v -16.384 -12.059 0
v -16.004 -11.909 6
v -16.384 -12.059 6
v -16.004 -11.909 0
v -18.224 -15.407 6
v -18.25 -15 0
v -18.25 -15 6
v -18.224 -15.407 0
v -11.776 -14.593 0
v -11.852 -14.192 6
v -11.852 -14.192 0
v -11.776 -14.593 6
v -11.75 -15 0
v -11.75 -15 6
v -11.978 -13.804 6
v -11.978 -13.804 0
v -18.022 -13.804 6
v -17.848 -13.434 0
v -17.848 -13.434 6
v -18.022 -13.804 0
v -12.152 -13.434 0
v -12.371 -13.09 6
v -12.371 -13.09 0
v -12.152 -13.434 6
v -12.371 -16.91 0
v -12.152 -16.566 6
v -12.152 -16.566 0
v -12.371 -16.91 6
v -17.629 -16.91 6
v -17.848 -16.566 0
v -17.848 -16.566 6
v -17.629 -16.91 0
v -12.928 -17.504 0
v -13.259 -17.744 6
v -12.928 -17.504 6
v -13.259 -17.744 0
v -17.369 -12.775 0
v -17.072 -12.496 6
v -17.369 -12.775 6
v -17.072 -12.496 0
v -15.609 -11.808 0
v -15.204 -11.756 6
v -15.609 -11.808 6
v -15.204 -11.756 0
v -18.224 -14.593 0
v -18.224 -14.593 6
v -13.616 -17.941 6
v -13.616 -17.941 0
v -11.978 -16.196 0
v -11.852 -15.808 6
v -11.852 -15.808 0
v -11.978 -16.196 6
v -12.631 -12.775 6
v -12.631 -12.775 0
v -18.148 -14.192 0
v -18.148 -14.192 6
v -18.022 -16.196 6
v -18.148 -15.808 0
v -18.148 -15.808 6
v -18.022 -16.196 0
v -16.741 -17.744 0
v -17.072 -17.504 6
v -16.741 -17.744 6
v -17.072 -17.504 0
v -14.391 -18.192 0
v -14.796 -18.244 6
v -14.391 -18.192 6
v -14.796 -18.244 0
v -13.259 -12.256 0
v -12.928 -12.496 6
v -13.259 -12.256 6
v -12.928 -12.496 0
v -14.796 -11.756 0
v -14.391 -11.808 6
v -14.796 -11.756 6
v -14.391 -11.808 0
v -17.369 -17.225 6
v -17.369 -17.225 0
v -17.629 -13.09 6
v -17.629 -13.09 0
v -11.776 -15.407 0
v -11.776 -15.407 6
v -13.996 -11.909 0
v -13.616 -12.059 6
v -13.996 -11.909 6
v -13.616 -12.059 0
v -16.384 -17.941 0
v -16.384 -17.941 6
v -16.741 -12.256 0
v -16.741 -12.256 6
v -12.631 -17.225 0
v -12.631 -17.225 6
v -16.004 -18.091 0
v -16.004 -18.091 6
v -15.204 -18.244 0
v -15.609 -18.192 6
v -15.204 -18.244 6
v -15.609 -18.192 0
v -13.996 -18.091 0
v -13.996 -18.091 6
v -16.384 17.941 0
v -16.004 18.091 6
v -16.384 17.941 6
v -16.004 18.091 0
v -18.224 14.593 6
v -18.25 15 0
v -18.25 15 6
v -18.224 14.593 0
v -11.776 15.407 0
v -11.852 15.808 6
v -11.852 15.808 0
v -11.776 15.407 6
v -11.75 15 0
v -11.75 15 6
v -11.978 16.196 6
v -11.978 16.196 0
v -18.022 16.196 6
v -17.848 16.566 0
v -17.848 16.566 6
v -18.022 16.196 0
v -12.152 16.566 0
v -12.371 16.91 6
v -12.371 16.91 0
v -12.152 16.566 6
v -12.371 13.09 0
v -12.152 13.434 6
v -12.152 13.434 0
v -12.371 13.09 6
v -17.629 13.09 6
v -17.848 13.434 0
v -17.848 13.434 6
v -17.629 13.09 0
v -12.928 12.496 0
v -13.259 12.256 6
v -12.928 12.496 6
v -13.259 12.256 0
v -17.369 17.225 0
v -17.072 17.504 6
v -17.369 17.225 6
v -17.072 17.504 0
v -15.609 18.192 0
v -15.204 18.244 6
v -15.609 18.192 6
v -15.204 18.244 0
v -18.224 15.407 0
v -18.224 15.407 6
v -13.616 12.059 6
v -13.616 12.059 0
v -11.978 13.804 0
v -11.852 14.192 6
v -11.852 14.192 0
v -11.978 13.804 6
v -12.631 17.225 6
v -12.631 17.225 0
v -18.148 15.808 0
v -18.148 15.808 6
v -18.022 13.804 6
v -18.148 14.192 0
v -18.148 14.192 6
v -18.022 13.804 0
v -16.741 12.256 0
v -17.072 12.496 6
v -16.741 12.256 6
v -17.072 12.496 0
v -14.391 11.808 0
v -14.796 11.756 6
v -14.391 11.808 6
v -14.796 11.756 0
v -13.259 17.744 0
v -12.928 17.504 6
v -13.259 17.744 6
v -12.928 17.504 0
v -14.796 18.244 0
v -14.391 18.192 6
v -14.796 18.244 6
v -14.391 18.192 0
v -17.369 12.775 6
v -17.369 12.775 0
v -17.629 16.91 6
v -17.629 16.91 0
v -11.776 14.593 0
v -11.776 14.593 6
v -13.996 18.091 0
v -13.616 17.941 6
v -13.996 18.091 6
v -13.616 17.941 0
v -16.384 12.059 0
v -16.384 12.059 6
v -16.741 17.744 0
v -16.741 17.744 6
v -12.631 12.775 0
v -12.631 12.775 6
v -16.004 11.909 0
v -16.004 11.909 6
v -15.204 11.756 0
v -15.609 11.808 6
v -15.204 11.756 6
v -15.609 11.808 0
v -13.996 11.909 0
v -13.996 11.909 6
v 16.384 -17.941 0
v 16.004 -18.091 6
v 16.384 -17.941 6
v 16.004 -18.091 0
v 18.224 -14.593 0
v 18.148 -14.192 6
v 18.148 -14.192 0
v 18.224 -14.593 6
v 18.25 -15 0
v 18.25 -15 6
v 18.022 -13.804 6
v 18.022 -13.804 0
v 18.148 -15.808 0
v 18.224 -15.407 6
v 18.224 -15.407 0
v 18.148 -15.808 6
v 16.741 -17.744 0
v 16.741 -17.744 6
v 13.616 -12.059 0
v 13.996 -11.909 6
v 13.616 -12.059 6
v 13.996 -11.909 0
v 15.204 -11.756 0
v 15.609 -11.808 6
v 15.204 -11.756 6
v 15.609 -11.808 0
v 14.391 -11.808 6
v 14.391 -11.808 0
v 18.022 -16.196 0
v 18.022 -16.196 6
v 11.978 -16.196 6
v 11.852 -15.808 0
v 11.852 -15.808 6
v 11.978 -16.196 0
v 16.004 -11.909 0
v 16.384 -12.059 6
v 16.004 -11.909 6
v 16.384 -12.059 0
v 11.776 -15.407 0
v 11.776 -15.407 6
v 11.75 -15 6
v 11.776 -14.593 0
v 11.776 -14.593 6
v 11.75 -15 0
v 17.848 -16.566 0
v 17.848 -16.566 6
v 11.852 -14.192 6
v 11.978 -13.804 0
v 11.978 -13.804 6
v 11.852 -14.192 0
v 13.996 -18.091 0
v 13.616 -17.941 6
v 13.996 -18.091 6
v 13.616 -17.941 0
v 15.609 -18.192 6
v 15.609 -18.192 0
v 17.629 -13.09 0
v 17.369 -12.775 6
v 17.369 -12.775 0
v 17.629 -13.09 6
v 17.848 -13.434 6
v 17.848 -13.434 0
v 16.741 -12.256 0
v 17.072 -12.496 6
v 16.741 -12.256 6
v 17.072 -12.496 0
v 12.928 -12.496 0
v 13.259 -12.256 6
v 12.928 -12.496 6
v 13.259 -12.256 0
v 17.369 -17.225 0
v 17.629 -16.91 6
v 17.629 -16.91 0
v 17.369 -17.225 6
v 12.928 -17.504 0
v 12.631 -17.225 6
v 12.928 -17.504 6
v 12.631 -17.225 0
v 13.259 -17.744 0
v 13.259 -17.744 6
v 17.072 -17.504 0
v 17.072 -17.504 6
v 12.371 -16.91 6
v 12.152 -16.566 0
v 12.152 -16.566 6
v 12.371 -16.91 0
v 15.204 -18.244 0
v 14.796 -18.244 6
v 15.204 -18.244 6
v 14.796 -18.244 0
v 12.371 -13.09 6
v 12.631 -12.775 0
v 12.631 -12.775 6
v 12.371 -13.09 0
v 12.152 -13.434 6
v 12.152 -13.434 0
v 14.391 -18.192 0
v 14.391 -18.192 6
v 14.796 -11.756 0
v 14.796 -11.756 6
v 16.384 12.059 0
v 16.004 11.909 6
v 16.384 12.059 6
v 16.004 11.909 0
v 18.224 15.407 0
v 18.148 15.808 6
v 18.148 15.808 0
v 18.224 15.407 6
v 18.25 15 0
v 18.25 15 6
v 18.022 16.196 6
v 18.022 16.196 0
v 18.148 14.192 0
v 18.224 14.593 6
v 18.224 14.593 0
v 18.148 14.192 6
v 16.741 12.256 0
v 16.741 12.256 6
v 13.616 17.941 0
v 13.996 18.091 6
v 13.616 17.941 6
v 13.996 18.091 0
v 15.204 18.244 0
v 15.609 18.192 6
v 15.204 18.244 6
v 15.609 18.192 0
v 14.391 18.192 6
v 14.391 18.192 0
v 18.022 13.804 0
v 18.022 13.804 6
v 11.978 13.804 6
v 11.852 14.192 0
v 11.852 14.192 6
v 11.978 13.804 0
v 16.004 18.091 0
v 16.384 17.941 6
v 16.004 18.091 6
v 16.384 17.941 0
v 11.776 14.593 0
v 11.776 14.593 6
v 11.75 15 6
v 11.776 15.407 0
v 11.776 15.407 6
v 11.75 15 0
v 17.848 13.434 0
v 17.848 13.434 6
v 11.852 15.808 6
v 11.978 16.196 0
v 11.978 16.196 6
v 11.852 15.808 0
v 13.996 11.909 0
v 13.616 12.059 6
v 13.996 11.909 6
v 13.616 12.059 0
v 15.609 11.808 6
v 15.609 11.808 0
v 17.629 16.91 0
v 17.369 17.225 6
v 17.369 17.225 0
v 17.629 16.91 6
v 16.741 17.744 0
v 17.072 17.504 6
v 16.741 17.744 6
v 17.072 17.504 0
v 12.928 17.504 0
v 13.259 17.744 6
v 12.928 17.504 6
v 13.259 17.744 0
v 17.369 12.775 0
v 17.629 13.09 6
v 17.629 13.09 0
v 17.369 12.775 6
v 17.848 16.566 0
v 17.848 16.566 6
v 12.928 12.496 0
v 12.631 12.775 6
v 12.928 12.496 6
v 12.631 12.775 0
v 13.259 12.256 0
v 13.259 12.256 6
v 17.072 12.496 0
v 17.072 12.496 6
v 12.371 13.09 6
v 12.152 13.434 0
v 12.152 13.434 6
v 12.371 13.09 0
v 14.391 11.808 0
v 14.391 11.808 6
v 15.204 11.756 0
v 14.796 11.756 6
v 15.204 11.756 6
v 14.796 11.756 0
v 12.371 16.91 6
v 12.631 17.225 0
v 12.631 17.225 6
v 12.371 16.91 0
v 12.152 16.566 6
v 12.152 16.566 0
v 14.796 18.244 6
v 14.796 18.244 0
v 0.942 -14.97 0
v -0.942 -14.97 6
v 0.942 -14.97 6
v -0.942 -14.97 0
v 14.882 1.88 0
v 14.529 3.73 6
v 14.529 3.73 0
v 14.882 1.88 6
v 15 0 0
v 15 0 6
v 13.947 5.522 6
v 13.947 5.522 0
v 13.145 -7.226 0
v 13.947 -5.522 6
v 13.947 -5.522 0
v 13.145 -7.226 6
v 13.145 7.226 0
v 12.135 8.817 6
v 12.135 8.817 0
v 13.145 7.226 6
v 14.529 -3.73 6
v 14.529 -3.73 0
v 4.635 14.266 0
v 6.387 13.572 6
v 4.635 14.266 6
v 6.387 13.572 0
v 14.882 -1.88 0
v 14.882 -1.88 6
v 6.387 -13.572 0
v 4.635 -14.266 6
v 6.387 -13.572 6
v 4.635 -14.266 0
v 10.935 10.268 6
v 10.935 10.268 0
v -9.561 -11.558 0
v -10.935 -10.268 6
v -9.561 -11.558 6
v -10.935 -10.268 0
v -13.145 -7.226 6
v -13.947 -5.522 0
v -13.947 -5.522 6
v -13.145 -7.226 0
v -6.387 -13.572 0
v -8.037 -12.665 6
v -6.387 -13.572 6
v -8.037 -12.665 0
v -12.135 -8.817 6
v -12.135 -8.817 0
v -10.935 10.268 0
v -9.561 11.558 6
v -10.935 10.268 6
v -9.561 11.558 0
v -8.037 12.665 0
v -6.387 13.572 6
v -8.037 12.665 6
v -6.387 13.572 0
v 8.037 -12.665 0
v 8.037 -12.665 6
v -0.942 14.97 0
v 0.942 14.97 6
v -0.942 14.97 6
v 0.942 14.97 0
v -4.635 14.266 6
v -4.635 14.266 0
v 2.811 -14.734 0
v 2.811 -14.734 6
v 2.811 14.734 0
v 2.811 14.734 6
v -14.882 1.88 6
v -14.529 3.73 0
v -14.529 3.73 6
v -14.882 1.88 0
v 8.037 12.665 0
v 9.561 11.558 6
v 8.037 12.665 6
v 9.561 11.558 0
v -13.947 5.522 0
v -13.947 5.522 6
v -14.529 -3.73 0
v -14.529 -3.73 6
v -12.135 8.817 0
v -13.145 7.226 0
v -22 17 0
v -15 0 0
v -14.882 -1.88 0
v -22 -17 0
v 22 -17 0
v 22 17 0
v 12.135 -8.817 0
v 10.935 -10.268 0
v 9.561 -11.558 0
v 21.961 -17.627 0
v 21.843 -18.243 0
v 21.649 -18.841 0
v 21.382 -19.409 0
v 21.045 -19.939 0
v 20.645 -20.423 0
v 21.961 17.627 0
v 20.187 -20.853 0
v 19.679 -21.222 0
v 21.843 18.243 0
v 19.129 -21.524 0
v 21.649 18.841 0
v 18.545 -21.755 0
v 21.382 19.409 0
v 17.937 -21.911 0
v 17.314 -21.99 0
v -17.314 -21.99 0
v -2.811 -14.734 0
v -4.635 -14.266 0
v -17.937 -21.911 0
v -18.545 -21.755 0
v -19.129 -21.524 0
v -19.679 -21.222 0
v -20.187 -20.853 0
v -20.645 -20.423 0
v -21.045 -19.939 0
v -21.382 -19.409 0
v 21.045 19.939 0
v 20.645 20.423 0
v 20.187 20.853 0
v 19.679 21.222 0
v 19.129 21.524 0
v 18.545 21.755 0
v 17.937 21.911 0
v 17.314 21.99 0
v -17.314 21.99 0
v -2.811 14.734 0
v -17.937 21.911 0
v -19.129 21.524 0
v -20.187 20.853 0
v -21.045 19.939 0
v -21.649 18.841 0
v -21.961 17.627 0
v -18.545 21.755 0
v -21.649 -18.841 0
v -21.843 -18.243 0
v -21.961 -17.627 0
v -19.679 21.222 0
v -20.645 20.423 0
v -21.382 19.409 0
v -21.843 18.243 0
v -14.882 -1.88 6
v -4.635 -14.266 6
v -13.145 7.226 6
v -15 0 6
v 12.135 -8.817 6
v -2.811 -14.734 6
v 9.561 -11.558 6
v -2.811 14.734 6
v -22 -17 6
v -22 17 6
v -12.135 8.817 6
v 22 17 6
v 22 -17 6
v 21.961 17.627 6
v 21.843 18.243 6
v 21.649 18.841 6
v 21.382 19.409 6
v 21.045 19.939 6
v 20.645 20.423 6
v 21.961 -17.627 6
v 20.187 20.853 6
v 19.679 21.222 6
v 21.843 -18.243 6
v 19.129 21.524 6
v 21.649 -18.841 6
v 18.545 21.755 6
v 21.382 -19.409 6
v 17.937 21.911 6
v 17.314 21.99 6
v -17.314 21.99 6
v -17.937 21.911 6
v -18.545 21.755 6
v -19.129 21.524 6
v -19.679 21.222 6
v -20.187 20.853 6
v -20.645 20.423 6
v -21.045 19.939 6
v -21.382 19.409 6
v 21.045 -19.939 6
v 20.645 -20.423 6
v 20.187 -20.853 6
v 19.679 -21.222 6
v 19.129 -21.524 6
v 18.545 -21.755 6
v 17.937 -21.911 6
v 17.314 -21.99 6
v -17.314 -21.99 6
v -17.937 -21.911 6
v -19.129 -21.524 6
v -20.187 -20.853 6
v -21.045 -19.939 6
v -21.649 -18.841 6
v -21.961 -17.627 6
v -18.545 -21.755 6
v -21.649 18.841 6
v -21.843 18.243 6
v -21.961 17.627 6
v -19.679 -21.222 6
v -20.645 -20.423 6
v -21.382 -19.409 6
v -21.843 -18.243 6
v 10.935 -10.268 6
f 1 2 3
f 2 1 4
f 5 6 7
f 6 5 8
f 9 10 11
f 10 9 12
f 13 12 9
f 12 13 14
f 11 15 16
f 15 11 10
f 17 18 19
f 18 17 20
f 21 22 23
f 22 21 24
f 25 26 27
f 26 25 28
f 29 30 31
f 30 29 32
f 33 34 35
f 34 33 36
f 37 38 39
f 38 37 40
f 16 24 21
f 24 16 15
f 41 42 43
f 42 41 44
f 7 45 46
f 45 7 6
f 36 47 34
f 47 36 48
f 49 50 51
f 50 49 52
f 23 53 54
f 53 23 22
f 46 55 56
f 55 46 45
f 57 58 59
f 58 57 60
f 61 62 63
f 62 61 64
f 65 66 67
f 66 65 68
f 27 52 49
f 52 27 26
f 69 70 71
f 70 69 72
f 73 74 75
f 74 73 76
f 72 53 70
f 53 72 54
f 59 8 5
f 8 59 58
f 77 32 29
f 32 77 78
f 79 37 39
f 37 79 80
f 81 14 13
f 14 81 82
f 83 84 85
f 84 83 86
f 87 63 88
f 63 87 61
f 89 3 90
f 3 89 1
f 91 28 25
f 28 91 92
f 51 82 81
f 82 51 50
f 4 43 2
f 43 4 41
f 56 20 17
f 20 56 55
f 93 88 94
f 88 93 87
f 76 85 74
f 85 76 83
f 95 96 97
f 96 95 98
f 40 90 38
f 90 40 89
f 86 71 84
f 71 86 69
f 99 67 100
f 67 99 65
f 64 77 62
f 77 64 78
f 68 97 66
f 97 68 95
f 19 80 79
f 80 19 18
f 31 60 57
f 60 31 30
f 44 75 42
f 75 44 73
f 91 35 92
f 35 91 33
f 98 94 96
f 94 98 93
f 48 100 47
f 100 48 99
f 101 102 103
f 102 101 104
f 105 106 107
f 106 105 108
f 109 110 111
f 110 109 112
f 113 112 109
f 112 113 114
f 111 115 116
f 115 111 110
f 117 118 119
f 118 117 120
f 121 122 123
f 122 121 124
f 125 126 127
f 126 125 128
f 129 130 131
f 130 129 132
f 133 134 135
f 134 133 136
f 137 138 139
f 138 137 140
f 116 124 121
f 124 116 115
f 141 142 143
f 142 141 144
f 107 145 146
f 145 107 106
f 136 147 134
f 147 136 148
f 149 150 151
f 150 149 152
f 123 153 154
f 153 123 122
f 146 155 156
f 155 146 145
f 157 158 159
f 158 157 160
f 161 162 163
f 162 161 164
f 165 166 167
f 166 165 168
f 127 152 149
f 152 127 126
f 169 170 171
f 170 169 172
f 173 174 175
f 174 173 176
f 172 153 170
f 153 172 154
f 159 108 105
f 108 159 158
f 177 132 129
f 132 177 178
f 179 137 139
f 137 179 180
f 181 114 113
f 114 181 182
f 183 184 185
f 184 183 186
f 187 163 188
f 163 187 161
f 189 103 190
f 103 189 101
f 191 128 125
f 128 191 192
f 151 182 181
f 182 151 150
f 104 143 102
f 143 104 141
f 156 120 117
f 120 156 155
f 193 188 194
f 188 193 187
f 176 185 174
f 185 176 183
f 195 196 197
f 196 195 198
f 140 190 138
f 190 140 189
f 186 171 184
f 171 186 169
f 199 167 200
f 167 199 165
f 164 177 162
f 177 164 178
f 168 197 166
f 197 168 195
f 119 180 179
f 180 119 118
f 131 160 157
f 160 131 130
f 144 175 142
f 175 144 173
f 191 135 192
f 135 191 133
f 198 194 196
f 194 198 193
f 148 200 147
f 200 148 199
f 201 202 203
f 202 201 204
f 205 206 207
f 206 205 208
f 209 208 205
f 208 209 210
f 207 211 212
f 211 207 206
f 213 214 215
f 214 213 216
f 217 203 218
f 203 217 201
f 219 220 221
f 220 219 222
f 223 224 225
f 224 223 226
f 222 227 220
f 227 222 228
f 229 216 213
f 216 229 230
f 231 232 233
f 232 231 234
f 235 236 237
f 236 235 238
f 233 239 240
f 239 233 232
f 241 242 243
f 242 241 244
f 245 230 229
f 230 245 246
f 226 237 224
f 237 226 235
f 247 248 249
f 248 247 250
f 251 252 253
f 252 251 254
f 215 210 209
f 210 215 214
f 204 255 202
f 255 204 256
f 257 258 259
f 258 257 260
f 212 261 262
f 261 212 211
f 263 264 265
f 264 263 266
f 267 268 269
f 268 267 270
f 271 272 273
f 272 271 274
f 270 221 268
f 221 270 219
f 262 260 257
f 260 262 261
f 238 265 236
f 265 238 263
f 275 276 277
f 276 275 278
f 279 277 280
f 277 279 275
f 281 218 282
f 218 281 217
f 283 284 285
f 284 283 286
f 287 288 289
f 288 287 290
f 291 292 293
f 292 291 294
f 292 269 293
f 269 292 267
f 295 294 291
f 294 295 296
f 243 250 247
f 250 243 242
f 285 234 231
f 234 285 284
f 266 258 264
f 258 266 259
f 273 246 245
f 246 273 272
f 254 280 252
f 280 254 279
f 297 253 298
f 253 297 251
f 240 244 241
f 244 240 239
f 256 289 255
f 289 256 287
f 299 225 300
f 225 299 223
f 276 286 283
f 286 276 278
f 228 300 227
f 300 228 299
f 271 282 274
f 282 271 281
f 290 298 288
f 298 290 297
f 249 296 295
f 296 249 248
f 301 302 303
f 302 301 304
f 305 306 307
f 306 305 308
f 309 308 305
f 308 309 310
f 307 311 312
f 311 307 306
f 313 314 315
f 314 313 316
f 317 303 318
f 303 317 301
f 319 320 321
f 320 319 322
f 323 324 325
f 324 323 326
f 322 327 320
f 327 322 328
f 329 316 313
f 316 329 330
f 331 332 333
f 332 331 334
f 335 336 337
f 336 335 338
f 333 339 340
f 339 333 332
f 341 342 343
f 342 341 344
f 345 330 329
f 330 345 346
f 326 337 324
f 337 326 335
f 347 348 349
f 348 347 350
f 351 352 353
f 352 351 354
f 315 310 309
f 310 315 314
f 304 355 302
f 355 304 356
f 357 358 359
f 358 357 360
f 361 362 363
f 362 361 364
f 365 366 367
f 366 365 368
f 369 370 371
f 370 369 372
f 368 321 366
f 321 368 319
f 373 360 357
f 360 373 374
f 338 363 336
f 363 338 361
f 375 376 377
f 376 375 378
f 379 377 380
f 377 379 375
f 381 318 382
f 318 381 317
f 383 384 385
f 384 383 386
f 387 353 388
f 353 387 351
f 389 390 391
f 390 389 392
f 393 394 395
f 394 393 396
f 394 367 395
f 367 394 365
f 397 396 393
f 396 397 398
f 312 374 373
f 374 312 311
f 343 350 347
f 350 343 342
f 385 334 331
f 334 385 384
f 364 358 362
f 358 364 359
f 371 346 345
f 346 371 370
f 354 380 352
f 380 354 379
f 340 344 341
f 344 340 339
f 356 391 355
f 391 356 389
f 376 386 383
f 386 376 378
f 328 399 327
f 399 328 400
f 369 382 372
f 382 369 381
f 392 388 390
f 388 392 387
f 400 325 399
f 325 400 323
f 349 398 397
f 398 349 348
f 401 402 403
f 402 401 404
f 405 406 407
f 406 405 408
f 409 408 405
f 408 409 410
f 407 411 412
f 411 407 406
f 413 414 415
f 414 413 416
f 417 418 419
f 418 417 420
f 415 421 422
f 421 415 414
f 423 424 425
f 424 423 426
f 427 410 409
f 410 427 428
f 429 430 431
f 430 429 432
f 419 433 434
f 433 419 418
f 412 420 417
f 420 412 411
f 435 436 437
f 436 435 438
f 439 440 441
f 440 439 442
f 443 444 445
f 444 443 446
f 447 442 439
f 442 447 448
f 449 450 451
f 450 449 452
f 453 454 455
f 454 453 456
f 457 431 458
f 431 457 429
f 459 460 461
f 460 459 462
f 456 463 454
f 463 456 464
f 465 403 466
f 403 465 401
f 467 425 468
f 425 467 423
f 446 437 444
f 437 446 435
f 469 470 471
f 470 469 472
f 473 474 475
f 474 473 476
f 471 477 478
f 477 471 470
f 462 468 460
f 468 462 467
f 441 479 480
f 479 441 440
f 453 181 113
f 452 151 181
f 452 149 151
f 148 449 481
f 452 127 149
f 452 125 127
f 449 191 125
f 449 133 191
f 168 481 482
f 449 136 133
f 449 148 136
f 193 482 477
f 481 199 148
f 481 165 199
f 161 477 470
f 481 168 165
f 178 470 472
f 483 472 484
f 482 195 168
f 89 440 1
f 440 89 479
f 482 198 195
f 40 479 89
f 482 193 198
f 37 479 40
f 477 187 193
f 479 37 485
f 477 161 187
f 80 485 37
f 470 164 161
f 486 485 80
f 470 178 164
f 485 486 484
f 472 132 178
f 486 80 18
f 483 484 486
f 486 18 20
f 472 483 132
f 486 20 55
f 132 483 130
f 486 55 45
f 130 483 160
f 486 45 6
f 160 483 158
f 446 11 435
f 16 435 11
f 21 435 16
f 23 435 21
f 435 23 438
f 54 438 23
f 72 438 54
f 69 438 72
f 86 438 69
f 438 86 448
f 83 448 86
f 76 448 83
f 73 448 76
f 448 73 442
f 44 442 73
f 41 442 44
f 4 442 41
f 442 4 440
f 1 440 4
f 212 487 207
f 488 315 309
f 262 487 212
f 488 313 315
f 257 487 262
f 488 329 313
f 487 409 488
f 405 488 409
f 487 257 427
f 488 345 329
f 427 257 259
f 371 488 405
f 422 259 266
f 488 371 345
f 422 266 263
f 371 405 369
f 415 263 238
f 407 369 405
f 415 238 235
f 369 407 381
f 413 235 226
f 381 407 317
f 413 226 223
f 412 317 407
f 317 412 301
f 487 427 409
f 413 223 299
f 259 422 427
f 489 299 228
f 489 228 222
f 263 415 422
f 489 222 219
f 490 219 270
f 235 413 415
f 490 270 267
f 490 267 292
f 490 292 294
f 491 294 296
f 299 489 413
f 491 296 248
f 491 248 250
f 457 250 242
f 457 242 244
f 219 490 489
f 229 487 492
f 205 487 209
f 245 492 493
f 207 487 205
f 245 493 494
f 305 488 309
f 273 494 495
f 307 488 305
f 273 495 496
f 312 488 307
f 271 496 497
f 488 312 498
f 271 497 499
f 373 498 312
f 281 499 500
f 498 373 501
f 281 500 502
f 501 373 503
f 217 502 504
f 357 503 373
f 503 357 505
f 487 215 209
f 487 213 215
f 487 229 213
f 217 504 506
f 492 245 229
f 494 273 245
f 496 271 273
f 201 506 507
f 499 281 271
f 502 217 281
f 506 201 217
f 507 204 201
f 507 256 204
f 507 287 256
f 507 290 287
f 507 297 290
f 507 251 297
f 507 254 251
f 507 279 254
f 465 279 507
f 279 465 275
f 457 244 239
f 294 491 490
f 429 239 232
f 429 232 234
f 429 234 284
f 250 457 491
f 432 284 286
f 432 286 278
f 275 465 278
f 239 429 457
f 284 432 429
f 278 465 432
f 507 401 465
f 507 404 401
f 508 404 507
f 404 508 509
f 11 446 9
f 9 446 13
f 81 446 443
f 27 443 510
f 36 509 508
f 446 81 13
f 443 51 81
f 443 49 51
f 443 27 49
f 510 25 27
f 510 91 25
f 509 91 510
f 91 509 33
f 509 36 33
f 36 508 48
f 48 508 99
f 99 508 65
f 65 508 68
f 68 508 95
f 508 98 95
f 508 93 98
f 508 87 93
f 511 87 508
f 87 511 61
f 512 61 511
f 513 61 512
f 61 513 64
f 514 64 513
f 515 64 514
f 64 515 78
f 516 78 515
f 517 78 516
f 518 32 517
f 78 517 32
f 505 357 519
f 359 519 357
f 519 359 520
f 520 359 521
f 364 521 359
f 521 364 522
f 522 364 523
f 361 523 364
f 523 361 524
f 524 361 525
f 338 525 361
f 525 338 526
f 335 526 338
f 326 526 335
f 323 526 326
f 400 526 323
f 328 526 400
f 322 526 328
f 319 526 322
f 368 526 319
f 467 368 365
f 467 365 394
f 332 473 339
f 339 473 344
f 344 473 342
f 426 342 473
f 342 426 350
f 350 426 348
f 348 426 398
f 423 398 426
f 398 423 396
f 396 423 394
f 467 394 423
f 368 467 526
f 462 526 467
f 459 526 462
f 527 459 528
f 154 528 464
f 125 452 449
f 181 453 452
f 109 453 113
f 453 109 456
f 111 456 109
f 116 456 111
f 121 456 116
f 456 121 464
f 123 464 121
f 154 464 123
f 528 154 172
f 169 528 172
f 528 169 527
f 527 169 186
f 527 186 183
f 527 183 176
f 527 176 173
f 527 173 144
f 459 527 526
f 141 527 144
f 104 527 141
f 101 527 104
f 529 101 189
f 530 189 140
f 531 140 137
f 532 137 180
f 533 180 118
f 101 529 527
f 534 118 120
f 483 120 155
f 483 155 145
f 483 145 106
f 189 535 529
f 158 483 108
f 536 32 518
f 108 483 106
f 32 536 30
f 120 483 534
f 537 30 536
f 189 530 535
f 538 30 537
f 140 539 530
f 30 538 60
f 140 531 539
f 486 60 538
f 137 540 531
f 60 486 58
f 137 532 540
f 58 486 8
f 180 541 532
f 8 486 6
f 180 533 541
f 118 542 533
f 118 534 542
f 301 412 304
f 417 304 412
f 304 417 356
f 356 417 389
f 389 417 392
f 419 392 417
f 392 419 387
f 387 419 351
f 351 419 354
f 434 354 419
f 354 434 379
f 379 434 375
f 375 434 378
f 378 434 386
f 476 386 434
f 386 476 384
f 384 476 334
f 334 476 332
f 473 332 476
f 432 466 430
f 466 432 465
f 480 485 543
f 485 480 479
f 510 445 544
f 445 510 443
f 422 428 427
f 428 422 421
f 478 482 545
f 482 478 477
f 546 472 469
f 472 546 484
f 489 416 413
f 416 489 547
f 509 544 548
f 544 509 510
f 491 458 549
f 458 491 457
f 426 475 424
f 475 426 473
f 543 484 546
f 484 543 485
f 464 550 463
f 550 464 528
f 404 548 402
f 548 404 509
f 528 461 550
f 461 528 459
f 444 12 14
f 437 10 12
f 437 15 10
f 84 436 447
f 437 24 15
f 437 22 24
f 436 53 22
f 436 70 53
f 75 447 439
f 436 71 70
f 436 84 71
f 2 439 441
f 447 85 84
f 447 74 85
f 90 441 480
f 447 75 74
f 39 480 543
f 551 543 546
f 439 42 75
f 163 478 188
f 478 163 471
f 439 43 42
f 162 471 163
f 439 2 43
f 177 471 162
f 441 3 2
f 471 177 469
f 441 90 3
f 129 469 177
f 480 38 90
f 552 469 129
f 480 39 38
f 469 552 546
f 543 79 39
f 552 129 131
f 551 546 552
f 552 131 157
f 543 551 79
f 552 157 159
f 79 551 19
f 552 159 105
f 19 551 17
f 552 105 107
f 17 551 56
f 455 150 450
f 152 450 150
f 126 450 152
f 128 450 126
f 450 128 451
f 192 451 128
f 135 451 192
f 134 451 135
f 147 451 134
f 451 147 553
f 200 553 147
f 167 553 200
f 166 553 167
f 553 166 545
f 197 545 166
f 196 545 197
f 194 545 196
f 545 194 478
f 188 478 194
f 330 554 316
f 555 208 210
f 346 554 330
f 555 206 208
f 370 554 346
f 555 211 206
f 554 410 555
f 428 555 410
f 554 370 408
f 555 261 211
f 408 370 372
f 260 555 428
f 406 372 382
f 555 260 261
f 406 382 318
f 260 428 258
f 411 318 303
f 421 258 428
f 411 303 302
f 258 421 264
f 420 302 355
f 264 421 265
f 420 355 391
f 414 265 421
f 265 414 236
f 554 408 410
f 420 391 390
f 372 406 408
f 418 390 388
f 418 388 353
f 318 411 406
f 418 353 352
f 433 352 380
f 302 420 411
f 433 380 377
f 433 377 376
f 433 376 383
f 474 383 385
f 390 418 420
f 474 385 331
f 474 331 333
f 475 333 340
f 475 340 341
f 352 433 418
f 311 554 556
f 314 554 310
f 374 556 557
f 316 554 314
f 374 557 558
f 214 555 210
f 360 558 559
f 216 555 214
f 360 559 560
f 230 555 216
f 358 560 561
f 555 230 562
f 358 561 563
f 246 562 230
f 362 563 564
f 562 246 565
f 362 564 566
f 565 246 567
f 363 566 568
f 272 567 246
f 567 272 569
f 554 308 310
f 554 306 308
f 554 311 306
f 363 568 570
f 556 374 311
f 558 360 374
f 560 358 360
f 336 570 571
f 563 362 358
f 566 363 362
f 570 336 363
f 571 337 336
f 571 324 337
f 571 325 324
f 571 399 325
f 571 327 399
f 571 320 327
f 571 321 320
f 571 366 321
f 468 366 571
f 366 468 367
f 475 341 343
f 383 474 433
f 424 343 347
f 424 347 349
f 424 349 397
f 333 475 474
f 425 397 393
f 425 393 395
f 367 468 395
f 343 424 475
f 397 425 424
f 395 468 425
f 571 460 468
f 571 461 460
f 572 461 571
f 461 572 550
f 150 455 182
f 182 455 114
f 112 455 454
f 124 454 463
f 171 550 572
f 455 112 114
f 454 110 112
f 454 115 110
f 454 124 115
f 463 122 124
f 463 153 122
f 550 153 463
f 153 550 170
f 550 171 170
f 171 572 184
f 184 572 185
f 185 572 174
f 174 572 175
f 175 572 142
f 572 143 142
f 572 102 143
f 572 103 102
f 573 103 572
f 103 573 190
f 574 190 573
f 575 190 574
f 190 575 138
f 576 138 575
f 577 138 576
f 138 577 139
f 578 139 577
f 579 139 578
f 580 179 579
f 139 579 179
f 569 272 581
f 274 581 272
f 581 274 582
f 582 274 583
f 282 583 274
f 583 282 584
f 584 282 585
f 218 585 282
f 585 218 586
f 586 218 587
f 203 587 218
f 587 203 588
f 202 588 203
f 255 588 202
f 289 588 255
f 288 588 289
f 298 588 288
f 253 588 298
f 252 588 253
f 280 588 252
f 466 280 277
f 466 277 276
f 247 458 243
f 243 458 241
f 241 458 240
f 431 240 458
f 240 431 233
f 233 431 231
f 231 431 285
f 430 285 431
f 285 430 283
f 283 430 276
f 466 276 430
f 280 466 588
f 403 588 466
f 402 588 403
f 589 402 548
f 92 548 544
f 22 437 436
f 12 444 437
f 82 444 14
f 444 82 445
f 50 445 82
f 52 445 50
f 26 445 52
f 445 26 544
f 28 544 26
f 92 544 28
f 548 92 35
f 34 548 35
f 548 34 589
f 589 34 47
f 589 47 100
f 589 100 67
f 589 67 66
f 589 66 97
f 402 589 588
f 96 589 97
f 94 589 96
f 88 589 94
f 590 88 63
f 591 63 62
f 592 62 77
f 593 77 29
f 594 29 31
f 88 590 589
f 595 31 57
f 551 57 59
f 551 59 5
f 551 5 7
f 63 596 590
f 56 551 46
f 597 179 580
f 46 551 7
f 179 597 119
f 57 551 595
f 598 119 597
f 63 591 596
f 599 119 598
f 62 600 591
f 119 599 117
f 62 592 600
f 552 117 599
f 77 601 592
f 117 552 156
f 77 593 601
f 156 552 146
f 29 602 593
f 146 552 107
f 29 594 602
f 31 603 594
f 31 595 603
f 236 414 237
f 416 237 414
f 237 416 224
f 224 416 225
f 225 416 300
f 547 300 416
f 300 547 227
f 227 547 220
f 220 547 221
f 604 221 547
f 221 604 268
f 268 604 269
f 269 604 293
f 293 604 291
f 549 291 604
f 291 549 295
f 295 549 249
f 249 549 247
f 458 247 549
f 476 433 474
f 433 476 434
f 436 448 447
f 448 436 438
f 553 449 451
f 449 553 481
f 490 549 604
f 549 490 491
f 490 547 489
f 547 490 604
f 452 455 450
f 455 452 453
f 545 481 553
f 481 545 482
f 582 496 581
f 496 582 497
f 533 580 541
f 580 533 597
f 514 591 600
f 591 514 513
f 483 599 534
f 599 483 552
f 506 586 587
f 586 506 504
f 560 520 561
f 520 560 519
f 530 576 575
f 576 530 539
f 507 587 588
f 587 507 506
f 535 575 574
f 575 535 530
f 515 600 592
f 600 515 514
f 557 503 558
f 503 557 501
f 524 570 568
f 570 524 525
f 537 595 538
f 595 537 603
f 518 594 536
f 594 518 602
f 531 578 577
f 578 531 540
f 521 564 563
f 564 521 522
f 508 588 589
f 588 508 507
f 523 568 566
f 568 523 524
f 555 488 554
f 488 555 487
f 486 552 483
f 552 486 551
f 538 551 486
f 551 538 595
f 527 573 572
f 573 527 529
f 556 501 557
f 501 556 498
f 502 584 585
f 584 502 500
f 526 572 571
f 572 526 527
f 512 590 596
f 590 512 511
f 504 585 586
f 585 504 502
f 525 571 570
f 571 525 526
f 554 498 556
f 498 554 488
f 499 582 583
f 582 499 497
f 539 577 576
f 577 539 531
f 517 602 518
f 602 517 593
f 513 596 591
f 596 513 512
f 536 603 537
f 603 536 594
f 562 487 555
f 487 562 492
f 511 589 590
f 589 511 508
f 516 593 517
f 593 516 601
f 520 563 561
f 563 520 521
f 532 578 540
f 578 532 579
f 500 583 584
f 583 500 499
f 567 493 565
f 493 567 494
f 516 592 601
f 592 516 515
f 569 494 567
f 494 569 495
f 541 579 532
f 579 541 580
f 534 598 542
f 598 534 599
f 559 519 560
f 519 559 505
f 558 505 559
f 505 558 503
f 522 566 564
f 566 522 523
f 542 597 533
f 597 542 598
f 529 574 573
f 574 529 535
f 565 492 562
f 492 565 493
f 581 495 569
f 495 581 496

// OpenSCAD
$fn = 50;

difference() {
	union() {
		hull() {
			translate(v = [-17.0, 17.0, 0]) {
				cylinder(h = 6, r = 5);
			}
			translate(v = [17.0, 17.0, 0]) {
				cylinder(h = 6, r = 5);
			}
			translate(v = [-17.0, -17.0, 0]) {
				cylinder(h = 6, r = 5);
			}
			translate(v = [17.0, -17.0, 0]) {
				cylinder(h = 6, r = 5);
			}
		}
	}
	union() {
		translate(v = [-15.0, -15.0, -100.0]) {
			cylinder(h = 200, r = 3.25);
		}
		translate(v = [-15.0, 15.0, -100.0]) {
			cylinder(h = 200, r = 3.25);
		}
		translate(v = [15.0, -15.0, -100.0]) {
			cylinder(h = 200, r = 3.25);
		}
		translate(v = [15.0, 15.0, -100.0]) {
			cylinder(h = 200, r = 3.25);
		}
		translate(v = [-15.0, -15.0, -100.0]) {
			cylinder(h = 200, r = 1.8);
		}
		translate(v = [-15.0, 15.0, -100.0]) {
			cylinder(h = 200, r = 1.8);
		}
		translate(v = [15.0, -15.0, -100.0]) {
			cylinder(h = 200, r = 1.8);
		}
		translate(v = [15.0, 15.0, -100.0]) {
			cylinder(h = 200, r = 1.8);
		}
		cylinder(h = 6, r = 15.0);
	}
}
